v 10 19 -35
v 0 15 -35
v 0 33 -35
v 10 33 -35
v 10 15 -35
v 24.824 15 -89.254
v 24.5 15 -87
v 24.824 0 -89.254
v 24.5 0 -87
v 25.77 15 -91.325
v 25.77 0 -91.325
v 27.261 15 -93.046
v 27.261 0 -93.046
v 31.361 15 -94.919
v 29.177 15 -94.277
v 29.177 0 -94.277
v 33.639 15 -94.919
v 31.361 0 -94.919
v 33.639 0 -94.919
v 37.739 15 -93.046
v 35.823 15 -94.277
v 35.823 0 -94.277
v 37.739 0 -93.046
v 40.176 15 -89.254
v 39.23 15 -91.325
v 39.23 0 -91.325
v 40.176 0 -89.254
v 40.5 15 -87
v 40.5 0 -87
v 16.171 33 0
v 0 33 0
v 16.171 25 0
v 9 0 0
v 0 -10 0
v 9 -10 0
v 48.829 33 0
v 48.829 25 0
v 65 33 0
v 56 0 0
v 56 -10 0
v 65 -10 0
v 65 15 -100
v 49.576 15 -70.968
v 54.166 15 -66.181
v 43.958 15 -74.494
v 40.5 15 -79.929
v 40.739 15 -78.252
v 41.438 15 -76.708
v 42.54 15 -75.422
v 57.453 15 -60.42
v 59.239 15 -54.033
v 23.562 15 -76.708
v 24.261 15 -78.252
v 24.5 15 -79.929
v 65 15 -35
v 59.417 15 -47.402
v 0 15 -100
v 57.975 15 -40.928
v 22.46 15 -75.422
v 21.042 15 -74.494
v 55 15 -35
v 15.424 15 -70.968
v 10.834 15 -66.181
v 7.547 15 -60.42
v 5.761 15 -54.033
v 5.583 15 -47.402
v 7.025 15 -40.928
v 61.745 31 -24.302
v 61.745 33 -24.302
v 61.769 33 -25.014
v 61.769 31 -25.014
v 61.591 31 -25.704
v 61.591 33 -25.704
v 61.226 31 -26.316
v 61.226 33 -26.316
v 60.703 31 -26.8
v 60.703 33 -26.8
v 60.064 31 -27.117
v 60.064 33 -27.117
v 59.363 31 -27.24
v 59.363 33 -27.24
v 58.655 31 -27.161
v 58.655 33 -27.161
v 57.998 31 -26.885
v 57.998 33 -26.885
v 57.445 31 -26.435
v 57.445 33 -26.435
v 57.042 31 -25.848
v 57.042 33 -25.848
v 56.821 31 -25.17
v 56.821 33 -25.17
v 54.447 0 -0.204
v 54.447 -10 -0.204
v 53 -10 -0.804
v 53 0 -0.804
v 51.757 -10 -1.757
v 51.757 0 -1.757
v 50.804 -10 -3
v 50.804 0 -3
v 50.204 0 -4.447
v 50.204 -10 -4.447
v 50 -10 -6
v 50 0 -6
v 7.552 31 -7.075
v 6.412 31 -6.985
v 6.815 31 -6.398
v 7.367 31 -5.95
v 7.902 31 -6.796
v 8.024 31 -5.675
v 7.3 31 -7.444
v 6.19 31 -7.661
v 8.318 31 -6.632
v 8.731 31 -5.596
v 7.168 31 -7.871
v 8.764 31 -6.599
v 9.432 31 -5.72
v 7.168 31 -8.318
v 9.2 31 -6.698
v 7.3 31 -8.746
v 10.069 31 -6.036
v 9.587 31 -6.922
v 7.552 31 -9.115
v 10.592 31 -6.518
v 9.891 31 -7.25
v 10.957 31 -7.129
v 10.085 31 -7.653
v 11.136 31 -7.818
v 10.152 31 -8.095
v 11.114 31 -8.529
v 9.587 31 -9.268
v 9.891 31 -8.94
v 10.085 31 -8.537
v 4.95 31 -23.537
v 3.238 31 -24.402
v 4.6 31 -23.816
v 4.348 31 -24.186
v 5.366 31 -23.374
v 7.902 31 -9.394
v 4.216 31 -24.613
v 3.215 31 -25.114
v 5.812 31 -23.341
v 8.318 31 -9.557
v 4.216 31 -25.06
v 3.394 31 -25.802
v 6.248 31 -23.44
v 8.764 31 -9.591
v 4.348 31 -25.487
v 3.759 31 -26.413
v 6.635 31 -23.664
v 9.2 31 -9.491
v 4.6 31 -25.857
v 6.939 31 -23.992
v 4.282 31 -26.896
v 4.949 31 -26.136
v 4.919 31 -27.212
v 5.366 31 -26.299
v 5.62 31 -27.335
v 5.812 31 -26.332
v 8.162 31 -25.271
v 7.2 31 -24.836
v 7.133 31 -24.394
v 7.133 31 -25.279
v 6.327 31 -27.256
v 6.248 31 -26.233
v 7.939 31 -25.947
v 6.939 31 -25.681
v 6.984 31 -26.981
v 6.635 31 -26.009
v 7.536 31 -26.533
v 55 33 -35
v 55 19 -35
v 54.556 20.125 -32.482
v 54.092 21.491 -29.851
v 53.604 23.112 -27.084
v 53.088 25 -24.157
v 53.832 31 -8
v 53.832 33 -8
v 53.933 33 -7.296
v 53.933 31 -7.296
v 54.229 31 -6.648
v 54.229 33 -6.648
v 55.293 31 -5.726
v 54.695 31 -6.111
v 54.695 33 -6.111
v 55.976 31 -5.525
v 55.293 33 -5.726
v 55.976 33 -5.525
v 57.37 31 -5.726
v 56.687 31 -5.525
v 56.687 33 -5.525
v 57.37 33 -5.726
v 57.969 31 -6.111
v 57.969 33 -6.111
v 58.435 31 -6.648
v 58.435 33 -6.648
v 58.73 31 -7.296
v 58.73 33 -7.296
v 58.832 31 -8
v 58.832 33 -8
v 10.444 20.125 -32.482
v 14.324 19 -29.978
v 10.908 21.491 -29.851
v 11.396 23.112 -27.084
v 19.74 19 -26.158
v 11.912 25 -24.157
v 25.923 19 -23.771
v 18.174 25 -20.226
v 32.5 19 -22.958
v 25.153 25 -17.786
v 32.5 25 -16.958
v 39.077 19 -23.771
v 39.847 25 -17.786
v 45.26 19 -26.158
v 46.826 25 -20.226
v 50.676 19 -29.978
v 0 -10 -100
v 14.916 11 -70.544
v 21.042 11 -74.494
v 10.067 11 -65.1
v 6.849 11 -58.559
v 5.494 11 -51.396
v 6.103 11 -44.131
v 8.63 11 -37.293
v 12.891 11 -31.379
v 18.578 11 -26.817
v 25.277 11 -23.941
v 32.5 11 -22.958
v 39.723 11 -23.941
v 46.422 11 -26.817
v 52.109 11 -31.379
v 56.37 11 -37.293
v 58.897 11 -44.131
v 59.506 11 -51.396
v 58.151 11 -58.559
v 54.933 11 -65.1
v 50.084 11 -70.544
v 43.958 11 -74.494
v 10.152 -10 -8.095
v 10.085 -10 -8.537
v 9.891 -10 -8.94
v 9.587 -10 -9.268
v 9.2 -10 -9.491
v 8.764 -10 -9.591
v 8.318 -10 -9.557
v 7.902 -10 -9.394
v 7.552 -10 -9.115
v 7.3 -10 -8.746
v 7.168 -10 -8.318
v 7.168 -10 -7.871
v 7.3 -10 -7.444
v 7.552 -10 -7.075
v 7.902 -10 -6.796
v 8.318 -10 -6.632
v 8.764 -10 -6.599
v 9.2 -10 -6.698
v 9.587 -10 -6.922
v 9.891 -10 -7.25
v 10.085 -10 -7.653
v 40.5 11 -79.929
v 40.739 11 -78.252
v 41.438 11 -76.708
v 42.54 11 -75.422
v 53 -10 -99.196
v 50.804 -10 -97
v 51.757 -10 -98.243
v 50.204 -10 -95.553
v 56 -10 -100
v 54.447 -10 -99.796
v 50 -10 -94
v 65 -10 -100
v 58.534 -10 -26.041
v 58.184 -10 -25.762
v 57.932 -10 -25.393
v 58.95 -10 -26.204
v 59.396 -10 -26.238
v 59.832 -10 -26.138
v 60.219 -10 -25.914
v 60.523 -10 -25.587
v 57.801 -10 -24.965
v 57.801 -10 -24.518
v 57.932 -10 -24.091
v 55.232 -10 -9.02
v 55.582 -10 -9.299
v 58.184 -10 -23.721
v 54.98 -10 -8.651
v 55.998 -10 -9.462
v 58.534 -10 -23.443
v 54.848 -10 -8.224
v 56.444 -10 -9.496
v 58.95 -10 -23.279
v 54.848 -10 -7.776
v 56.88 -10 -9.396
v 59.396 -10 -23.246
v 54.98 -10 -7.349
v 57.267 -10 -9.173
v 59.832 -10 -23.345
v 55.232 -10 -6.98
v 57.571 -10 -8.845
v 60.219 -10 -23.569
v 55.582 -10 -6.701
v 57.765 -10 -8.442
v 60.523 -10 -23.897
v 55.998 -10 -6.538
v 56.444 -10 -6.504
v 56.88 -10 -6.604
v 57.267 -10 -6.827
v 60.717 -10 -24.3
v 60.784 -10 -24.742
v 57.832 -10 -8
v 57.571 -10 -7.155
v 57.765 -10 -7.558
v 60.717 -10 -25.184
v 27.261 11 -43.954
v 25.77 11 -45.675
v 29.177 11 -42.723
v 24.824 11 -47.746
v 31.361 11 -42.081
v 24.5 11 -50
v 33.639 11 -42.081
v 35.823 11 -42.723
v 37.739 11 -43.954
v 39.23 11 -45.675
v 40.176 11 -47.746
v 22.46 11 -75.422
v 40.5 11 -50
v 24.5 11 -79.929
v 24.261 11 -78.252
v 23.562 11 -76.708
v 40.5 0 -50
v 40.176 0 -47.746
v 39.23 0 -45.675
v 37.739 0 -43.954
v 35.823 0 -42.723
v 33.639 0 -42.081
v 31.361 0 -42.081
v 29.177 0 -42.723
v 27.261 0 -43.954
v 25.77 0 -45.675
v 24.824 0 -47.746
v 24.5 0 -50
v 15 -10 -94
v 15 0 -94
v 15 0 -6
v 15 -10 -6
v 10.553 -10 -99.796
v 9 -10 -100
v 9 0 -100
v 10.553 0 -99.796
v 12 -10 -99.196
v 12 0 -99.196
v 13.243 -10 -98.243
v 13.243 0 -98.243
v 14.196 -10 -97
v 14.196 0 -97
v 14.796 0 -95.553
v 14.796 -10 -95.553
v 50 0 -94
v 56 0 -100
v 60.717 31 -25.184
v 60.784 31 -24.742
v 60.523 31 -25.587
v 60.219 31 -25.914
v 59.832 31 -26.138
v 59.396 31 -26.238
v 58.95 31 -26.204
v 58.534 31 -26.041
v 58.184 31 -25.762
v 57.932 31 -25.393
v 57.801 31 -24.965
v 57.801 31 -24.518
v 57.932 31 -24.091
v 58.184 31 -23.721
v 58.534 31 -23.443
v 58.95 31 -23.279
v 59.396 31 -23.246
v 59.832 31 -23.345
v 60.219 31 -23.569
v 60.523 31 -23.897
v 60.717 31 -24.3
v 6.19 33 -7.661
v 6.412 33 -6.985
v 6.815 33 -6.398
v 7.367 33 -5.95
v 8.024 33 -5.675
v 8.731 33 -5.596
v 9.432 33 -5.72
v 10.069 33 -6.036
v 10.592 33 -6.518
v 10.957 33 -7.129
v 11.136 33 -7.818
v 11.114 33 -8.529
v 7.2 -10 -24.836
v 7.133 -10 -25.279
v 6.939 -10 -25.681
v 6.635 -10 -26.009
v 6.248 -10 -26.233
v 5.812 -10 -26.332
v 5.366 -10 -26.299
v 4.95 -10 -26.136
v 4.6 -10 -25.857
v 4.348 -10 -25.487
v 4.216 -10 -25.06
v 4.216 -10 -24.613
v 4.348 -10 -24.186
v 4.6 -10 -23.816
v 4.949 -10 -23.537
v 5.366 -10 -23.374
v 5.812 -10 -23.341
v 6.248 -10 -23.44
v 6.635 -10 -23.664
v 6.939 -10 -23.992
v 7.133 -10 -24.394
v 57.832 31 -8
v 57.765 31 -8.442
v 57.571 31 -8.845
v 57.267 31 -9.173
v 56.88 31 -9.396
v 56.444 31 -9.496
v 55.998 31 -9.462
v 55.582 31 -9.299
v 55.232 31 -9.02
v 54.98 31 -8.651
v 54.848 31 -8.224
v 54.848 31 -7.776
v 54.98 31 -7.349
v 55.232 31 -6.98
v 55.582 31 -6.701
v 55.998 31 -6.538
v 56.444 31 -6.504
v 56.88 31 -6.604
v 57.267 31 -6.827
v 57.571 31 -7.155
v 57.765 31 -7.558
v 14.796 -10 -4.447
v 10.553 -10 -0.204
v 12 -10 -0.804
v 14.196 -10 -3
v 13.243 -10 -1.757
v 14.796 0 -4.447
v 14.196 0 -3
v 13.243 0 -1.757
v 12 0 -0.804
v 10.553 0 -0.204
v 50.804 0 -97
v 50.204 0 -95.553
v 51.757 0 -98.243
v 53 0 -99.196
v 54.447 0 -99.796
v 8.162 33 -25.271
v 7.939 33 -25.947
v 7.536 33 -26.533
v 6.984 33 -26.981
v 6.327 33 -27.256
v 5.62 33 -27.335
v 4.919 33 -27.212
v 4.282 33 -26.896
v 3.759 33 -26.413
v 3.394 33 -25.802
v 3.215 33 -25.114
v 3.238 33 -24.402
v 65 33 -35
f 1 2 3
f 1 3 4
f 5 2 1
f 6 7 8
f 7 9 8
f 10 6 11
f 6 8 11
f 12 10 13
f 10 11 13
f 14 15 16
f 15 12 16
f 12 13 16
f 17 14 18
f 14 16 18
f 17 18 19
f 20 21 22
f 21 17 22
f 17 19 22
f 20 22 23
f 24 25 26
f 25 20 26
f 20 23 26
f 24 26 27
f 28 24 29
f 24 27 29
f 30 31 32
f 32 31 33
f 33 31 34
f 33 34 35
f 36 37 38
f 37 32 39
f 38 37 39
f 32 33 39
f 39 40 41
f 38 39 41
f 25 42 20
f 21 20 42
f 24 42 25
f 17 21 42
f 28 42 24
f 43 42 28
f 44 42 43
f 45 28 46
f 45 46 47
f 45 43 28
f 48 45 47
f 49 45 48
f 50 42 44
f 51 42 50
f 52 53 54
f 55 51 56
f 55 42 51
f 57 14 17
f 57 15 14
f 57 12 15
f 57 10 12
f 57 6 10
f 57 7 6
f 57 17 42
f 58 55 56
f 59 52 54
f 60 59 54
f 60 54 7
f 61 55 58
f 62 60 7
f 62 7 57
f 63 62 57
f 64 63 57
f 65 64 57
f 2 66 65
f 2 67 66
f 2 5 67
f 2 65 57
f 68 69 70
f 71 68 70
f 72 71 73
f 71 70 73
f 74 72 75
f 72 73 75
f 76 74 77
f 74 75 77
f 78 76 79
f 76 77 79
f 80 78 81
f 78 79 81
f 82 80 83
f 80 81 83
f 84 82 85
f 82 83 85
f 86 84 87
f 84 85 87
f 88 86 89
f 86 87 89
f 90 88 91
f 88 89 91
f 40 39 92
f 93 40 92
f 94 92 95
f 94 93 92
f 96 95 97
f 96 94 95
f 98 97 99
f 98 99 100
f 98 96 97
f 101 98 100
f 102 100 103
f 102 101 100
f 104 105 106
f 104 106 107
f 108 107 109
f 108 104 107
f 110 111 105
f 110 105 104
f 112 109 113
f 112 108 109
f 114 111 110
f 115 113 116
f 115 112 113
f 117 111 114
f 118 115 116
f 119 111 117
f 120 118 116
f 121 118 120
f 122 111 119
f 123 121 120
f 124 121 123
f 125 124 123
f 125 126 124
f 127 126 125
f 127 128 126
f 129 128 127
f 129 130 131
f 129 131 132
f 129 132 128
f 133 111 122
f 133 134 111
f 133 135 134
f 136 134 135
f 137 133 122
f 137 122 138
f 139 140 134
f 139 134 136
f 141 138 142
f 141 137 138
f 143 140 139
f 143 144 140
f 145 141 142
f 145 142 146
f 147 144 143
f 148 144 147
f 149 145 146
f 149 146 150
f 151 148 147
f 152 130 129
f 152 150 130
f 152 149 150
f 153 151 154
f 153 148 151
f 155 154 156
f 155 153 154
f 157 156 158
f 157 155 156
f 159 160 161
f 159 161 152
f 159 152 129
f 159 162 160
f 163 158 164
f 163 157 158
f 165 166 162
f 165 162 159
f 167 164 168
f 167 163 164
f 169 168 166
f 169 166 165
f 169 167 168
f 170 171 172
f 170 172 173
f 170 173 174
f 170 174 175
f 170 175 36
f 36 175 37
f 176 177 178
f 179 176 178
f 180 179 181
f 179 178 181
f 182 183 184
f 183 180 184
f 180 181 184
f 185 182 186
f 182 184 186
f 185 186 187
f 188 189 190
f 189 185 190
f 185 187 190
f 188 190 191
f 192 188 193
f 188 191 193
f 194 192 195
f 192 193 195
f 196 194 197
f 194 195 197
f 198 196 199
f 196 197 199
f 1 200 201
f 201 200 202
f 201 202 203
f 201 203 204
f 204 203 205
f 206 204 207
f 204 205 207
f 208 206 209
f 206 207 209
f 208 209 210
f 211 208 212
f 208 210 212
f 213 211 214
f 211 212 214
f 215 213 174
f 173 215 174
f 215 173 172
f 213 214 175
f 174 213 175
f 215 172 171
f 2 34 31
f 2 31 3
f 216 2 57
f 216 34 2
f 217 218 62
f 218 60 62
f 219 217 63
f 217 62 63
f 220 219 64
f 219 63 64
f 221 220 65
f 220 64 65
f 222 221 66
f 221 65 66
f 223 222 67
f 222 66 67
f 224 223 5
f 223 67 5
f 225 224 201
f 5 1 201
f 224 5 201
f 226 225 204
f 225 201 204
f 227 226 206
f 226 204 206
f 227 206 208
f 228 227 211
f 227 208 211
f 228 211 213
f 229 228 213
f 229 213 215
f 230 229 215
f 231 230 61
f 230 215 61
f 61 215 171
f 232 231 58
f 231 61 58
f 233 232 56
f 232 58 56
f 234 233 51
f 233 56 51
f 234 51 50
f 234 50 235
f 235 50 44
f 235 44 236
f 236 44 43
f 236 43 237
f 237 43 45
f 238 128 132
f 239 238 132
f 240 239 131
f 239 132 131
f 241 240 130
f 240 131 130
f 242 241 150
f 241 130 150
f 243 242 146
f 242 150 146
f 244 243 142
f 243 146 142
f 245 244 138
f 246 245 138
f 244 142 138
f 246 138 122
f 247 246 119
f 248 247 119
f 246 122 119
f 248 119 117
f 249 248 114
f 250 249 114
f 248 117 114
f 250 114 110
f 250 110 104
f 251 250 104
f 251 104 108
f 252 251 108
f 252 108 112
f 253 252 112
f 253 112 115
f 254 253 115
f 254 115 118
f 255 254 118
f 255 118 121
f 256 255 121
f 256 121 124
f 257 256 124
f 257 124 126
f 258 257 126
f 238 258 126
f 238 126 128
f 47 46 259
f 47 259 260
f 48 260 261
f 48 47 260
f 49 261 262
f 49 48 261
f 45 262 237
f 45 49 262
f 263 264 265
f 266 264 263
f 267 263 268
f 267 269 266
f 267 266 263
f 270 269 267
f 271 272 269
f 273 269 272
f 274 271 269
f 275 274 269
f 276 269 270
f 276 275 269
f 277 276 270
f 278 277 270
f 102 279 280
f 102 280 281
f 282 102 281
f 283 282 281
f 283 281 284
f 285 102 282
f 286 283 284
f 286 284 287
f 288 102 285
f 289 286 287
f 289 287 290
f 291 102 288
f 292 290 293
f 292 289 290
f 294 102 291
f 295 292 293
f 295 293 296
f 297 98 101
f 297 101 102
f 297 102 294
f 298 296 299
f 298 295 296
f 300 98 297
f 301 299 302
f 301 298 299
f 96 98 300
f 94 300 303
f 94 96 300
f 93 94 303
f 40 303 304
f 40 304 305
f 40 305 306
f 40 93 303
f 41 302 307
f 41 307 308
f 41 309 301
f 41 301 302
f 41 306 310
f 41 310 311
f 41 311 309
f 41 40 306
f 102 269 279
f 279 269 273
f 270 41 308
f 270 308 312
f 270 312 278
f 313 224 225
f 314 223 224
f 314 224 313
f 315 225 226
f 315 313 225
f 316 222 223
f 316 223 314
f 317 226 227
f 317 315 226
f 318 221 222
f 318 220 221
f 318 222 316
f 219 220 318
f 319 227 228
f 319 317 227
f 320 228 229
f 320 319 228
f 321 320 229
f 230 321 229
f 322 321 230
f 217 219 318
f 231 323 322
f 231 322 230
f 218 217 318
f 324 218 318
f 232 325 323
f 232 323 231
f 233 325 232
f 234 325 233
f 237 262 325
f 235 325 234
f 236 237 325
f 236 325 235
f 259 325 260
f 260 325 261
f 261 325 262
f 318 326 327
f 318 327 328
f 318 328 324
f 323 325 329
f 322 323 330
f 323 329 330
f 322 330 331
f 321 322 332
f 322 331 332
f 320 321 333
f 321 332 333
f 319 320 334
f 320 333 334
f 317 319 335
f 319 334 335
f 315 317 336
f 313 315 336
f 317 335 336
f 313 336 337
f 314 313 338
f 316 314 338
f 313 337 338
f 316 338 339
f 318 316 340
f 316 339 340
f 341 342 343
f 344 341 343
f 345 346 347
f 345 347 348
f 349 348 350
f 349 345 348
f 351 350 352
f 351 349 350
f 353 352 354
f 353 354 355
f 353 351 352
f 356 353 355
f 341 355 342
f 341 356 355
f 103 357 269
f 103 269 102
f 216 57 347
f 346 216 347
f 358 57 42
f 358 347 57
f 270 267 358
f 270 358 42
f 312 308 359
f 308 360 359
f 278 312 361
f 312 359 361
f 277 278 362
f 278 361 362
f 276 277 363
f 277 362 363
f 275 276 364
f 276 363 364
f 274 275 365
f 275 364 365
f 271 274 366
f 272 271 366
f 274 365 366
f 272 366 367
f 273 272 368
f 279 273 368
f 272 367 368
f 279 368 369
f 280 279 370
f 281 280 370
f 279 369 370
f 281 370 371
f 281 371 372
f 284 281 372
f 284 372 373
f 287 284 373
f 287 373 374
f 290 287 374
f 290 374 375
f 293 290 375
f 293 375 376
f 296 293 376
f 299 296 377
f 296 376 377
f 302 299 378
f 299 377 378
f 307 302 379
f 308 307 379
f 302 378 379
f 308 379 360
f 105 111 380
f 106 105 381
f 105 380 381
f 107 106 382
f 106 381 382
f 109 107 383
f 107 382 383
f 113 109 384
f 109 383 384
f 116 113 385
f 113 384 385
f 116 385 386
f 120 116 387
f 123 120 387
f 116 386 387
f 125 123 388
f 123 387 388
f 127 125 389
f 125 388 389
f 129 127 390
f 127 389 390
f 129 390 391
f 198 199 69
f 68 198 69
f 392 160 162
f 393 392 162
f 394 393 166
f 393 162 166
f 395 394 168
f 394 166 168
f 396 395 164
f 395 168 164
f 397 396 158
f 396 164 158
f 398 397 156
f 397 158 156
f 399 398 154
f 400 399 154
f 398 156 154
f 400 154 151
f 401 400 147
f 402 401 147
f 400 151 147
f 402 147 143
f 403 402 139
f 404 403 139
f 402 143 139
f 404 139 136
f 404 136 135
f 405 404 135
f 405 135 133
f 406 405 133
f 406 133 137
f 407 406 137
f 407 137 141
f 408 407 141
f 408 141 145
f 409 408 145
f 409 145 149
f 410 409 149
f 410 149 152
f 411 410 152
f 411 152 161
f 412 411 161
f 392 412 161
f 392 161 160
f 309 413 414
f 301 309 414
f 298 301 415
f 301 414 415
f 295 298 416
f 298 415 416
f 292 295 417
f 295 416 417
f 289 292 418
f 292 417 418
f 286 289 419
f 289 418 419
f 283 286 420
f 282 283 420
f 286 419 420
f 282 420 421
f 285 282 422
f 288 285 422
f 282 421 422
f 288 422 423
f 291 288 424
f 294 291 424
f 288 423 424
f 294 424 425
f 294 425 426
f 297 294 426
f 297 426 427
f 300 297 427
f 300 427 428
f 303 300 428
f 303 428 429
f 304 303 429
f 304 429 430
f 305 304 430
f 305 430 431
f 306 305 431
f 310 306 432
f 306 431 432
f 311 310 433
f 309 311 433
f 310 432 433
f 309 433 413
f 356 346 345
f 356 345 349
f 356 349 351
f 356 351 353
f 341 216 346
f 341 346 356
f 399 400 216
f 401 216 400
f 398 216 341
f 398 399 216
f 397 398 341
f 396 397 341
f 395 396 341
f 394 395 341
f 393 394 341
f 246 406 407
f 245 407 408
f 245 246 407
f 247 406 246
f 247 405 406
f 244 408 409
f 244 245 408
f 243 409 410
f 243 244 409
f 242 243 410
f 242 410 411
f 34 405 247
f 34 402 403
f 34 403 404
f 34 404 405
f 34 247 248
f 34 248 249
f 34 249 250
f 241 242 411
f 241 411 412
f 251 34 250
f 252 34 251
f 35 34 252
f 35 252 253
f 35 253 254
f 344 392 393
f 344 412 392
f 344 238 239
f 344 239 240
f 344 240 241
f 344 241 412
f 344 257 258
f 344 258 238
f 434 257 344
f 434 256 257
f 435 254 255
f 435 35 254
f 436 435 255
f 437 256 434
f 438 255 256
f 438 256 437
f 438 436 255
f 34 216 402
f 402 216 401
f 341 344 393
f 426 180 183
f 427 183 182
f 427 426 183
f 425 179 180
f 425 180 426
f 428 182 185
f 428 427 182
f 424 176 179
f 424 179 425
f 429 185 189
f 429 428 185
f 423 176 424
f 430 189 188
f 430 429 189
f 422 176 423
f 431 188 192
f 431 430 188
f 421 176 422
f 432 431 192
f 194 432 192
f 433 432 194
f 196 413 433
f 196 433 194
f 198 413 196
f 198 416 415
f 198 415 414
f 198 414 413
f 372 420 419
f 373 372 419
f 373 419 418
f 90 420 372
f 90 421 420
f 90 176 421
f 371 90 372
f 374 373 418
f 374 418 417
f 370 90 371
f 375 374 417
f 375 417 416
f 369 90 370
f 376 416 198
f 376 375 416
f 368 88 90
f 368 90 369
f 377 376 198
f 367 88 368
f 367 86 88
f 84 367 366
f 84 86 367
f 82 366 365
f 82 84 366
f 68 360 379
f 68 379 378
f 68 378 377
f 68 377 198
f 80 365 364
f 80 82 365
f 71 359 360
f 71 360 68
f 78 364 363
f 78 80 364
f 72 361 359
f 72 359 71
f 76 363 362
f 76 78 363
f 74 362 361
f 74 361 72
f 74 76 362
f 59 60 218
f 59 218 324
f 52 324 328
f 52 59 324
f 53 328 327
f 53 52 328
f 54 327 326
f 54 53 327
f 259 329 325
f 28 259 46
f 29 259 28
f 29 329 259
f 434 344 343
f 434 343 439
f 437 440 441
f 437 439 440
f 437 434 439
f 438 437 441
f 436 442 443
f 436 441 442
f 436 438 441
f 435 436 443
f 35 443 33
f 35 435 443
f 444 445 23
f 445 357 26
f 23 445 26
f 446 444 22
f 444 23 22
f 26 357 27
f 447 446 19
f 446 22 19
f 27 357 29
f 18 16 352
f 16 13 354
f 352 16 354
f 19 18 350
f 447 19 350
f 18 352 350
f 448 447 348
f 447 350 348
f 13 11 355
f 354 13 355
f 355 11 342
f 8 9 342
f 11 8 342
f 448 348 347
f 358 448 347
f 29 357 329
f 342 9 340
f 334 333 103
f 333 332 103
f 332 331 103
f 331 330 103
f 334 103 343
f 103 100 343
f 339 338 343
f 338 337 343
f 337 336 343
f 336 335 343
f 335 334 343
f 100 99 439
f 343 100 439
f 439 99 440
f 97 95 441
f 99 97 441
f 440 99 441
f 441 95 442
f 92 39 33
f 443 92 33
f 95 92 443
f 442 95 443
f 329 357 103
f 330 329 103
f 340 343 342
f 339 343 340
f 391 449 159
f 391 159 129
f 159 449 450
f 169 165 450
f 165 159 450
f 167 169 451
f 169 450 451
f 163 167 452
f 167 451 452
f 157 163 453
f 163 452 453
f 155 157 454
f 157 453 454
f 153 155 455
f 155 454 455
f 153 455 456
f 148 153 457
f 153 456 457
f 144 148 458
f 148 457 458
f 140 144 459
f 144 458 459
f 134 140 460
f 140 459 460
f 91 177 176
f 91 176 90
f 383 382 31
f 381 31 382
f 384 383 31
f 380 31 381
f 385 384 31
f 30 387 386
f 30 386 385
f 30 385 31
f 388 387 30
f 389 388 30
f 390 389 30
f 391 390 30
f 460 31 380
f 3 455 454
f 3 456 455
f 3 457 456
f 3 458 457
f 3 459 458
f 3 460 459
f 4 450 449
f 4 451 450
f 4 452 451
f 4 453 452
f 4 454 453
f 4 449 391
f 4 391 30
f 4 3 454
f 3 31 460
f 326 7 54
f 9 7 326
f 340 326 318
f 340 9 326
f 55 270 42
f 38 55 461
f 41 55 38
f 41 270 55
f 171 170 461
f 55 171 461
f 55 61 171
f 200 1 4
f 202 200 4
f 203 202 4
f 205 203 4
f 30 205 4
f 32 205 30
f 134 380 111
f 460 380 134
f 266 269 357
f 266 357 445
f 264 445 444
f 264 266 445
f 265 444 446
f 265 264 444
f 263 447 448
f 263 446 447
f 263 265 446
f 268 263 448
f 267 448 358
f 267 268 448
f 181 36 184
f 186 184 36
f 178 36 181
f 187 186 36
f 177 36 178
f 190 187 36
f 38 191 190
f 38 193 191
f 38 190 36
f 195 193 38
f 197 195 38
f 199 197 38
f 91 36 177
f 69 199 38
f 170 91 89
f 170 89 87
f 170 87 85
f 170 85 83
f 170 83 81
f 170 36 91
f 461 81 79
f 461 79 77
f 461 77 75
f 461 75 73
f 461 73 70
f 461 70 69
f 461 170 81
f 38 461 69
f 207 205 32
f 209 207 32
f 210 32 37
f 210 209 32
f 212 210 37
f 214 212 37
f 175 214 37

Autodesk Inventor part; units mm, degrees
ref_plane "YZ Plane" through (0, 0, 0) normal (1, 0, 0) x (0, 1, 0)
ref_plane "XZ Plane" through (0, 0, 0) normal (0, 1, 0) x (-1, 0, 0)
ref_plane "XY Plane" through (0, 0, 0) normal (0, 0, 1) x (1, 0, 0)
sketch "Szkic1" plane through (0, 0, 0) normal (0, 1, 0) x (-1, 0, 0)
  line L0 (0, 0) -> (0, -100)
  line L1 (0, -100) -> (-65, -100)
  line L2 (-65, -100) -> (-65, 0)
  line L3 (-65, 0) -> (0, 0)
  dimension "d0" = 100
  dimension "d1" = 65
extrude "Wyciągnięcie proste1" add sketch "Szkic1" along normal blind 15
sketch "Szkic3" plane through (0, 0, 0) normal (0, -1, 0) x (1, 0, 0)
  line L0 (0, 0) -> (65, 0) projected
  line L1 (32.5, 0) -> (32.5, -100)
  line L2 (65, -100) -> (0, -100) projected
  line L3 (32.5, -50) -> (15, -50)
  line L4 (15, -50) -> (50, -50)
  line L5 (50, -50) -> (50, 0)
  line L6 (65, 0) -> (65, -100) projected
  line L7 (50, 0) -> (65, 0)
  line L8 (65, 0) -> (65, -100)
  line L9 (65, -100) -> (50, -100)
  line L10 (50, -100) -> (50, -50)
  line L11 (15, -50) -> (15, -100)
  line L12 (15, -100) -> (0, -100)
  line L13 (0, -100) -> (0, 0) projected
  line L14 (0, -100) -> (0, 0)
  line L15 (0, 0) -> (15, 0)
  line L16 (15, -50) -> (15, 0)
  dimension "d4" = 17.5
  dimension "d5" = 35
extrude "Wyciągnięcie proste2" add sketch "Szkic3" along normal blind 10 contours L0 L16 L11 L2 L13 | L0 L6 L2 L10 L5
fillet "Zaokrąglenie1" radius 6 4 edges at (15, -5, -100) (15, -5, 0) (50, -5, 0) (50, -5, -100)
sketch "Szkic4" plane through (0, 15, 0) normal (0, 1, 0) x (1, 0, 0)
  line L0 (0, 0) -> (0, 35)
  line L1 (0, 0) -> (0, 100) projected
  line L2 (0, 35) -> (65, 35)
  line L3 (65, 100) -> (65, 0) projected
  line L4 (0, 0) -> (65, 0) projected
  line L5 (65, 0) -> (65, 35)
  line L6 (0, 0) -> (65, 0)
  line L7 (9, 0) -> (56, 0) projected
  dimension "d9" = 35
extrude "Wyciągnięcie proste3" add sketch "Szkic4" along normal blind 10
sketch "Szkic5" plane through (0, 25, 0) normal (0, 1, 0) x (1, 0, 0)
  line L0 (0, 0) -> (32.5, 0)
  line L1 (9, 0) -> (56, 0) projected
  line L2 (32.5, 0) -> (32.5, 100)
  line L3 (56, 100) -> (9, 100) projected
  line L4 (0, 35) -> (65, 35) projected
  line L5 (32.5, 35) -> (10, 35)
  line L6 (10, 35) -> (55, 35)
  line L7 (55, 35) -> (55, 0)
  line L8 (10, 35) -> (10, 0)
  line L9 (10, 35) -> (16.1714, 0)
  line L10 (10, 35) -> (45.5399, 35) construction
  line L11 (55, 35) -> (48.8286, 0)
  line L12 (55, 35) -> (90.5399, 35) construction
  line L13 (65, 0) -> (65, 35) projected
  line L14 (55, 0) -> (65, 0)
  line L15 (65, 0) -> (65, 35)
  line L16 (55, 35) -> (65, 35)
  line L17 (10, 35) -> (0, 35)
  line L18 (0, 35) -> (0, 0) projected
  line L19 (0, 0) -> (10, 0)
  line L20 (9, 0) -> (0, 0) projected
  line L21 (0, 0) -> (0, 35)
  line L22 (0, 0) -> (0, 100) projected
  dimension "d12" = 22.5
  dimension "d13" = 45
  dimension "d14" = 80
  dimension "d15" = 100
extrude "Wyciągnięcie proste4" add sketch "Szkic5" along normal blind 8 contours L18 L4 L8 L0 | L8 L9 L0 | L4 L13 L14 L1 L7 | L7 L1 L11
sketch "Szkic6" plane through (0, 15, 0) normal (0, 1, 0) x (1, 0, 0)
  line L0 (56, 100) -> (9, 100) projected
  line L1 (32.5, 100) -> (32.5, 0)
  line L2 (32.5, 0) -> (32.5, 50)
  line L3 (32.5, 50) -> (0, 50)
  line L4 (0, 0) -> (0, 100) projected
  line L5 (32.5, 50) -> (65, 50)
  line L6 (65, 35) -> (65, 100) projected
  circle A0 centre (32.5, 50) radius 27.0416
  point P0 (10, 35)
extrude "Wyciągnięcie proste5" cut sketch "Szkic6" along normal blind 15 and the other way blind 4
chamfer "Faza1" distance 6 angle 45 1 edges at (32.5, 25, -22.9584)
sketch "Szkic7" plane through (0, 0, 0) normal (0, -1, 0) x (1, 0, 0)
  line L0 (16.1714, 0) -> (48.8286, 0) projected
  line L1 (32.5, 0) -> (32.5, -100)
  line L2 (65, -100) -> (0, -100) projected
  line L3 (32.5, -50) -> (0, -50)
  line L4 (0, -50) -> (0, -87)
  line L5 (0, -100) -> (0, -35) projected
  line L6 (0, -87) -> (32.5, -87)
  circle A0 centre (32.5, -50) radius 8
  circle A1 centre (32.5, -87) radius 8
  line L7 (40.5, -50) -> (40.5, -87)
  line L8 (24.5, -87) -> (24.5, -50)
  point P0 (0, 0)
  dimension "d25" = 37
  dimension "d26" = 16
  dimension "d27" = 16
extrude "Wyciągnięcie proste6" cut sketch "Szkic7" against normal blind 15 contours A0 L1 | L1 L3 A0 | L1 A0 L3 | L7 A1 L1 A0 | A0 L1 A1 L8 | A1 L1 | A1 L1 L6 | L6 L1 A1
fillet "Zaokrąglenie2" radius 6 2 edges at (24.5, 13, -75.8312) (40.5, 13, -75.8312)
sketch "Szkic8" plane through (0, 33, 0) normal (0, 1, 0) x (1, 0, 0)
  line L0 (55, 35) -> (48.8286, 0) projected
  line L1 (51.9929, 17.9457) -> (57.9017, 16.9038)
  line L2 (51.9929, 17.9457) -> (57.9929, 17.9457) construction
  line L3 (57.9017, 16.9038) -> (61.0926, 35)
  line L4 (65, 35) -> (55, 35) projected
  line L5 (57.9017, 16.9038) -> (54.9211, 0)
  line L6 (65, 0) -> (56, 0) projected
  line L7 (48.8286, 0) -> (65, 0) projected
  line L8 (50.9367, 0) -> (50.9367, 8)
  line L9 (50.9367, 0) -> (58.9367, 0) construction
  line L10 (50.9367, 8) -> (65, 8)
  line L11 (65, 0) -> (65, 35) projected
  circle A0 centre (56.3317, 8) radius 2.5
  line L12 (56.3317, 8) -> (59.2838, 24.7417)
  circle A1 centre (59.2838, 24.7417) radius 2.5
  line L13 (53.8317, 8) -> (56.8208, 25.1705)
  line L14 (58.8317, 8) -> (61.7448, 24.302)
  point P0 (0, 0)
  dimension "d31" = 6
  dimension "d32" = 10
  dimension "d33" = 8
  dimension "d34" = 90
  dimension "d35" = 5
  dimension "d36" = 17
  dimension "d37" = 5
extrude "Wyciągnięcie proste7" cut sketch "Szkic8" against normal blind 2 contours L13 A1 L3 L1 | L1 L5 A0 L13 | A1 L3 | L3 A1 | L3 A1 L14 A0 L5 | A0 L5 L10 L13 | A0 L10 L5 | L10 L5 A0 | A0 L5 L10
sketch "Szkic9" plane through (0, 33, 0) normal (0, 1, 0) x (1, 0, 0)
  line L0 (16.1714, 0) -> (10, 35) projected
  line L1 (12.5503, 20.5363) -> (6.6415, 19.4944)
  line L2 (12.5503, 20.5363) -> (18.5503, 20.5363) construction
  line L3 (6.6415, 19.4944) -> (3.9074, 35)
  line L4 (0, 35) -> (10, 35) projected
  line L5 (6.6415, 19.4944) -> (10.0622, 0.0948)
  line L6 (10.0622, 0.0948) -> (10.0622, 8.0948)
  line L7 (0, 35) -> (0, 0) projected
  line L8 (8.6516, 8.0948) -> (5.6995, 24.8365)
  circle A0 centre (8.6516, 8.0948) radius 2.5
  circle A1 centre (5.6995, 24.8365) radius 2.5
  line L9 (8.1616, 25.2706) -> (11.1136, 8.5289)
  line L10 (6.1895, 7.6606) -> (3.2375, 24.4024)
  dimension "d40" = 6
  dimension "d41" = 170
  dimension "d42" = 8
  dimension "d43" = 17
  dimension "d44" = 5
  dimension "d45" = 5
extrude "Wyciągnięcie proste8" cut sketch "Szkic9" against normal blind 2 contours L9 A0 L5 L1 | L1 L3 A1 L9 | L5 A0 L10 A1 L3 | A1 L3 | A0 L5 | L3 A1 | L5 A0
sketch "Szkic10" plane through (0, 31, 0) normal (0, 1, 0) x (1, 0, 0)
  arc A0 (8.1616, 25.2706) -> (3.2375, 24.4024) centre (5.6995, 24.8365) ccw projected
  arc A1 (6.1895, 7.6606) -> (11.1136, 8.5289) centre (8.6516, 8.0948) ccw projected
  line L0 (5.6995, 24.8365) -> (8.6516, 8.0948)
  circle A2 centre (8.6516, 8.0948) radius 1.5
  circle A3 centre (5.6995, 24.8365) radius 1.5
  arc A4 (53.8317, 8) -> (58.8317, 8) centre (56.3317, 8) ccw projected
  arc A5 (61.7448, 24.302) -> (56.8208, 25.1705) centre (59.2838, 24.7417) ccw projected
  line L1 (56.3317, 8) -> (59.2838, 24.7417)
  circle A6 centre (56.3317, 8) radius 1.5
  circle A7 centre (59.2838, 24.7417) radius 1.5
  point P0 (0, 0)
  dimension "d48" = 3
  dimension "d49" = 3
  dimension "d50" = 3
  dimension "d51" = 3
extrude "Wyciągnięcie proste9" cut sketch "Szkic10" against normal blind 41
